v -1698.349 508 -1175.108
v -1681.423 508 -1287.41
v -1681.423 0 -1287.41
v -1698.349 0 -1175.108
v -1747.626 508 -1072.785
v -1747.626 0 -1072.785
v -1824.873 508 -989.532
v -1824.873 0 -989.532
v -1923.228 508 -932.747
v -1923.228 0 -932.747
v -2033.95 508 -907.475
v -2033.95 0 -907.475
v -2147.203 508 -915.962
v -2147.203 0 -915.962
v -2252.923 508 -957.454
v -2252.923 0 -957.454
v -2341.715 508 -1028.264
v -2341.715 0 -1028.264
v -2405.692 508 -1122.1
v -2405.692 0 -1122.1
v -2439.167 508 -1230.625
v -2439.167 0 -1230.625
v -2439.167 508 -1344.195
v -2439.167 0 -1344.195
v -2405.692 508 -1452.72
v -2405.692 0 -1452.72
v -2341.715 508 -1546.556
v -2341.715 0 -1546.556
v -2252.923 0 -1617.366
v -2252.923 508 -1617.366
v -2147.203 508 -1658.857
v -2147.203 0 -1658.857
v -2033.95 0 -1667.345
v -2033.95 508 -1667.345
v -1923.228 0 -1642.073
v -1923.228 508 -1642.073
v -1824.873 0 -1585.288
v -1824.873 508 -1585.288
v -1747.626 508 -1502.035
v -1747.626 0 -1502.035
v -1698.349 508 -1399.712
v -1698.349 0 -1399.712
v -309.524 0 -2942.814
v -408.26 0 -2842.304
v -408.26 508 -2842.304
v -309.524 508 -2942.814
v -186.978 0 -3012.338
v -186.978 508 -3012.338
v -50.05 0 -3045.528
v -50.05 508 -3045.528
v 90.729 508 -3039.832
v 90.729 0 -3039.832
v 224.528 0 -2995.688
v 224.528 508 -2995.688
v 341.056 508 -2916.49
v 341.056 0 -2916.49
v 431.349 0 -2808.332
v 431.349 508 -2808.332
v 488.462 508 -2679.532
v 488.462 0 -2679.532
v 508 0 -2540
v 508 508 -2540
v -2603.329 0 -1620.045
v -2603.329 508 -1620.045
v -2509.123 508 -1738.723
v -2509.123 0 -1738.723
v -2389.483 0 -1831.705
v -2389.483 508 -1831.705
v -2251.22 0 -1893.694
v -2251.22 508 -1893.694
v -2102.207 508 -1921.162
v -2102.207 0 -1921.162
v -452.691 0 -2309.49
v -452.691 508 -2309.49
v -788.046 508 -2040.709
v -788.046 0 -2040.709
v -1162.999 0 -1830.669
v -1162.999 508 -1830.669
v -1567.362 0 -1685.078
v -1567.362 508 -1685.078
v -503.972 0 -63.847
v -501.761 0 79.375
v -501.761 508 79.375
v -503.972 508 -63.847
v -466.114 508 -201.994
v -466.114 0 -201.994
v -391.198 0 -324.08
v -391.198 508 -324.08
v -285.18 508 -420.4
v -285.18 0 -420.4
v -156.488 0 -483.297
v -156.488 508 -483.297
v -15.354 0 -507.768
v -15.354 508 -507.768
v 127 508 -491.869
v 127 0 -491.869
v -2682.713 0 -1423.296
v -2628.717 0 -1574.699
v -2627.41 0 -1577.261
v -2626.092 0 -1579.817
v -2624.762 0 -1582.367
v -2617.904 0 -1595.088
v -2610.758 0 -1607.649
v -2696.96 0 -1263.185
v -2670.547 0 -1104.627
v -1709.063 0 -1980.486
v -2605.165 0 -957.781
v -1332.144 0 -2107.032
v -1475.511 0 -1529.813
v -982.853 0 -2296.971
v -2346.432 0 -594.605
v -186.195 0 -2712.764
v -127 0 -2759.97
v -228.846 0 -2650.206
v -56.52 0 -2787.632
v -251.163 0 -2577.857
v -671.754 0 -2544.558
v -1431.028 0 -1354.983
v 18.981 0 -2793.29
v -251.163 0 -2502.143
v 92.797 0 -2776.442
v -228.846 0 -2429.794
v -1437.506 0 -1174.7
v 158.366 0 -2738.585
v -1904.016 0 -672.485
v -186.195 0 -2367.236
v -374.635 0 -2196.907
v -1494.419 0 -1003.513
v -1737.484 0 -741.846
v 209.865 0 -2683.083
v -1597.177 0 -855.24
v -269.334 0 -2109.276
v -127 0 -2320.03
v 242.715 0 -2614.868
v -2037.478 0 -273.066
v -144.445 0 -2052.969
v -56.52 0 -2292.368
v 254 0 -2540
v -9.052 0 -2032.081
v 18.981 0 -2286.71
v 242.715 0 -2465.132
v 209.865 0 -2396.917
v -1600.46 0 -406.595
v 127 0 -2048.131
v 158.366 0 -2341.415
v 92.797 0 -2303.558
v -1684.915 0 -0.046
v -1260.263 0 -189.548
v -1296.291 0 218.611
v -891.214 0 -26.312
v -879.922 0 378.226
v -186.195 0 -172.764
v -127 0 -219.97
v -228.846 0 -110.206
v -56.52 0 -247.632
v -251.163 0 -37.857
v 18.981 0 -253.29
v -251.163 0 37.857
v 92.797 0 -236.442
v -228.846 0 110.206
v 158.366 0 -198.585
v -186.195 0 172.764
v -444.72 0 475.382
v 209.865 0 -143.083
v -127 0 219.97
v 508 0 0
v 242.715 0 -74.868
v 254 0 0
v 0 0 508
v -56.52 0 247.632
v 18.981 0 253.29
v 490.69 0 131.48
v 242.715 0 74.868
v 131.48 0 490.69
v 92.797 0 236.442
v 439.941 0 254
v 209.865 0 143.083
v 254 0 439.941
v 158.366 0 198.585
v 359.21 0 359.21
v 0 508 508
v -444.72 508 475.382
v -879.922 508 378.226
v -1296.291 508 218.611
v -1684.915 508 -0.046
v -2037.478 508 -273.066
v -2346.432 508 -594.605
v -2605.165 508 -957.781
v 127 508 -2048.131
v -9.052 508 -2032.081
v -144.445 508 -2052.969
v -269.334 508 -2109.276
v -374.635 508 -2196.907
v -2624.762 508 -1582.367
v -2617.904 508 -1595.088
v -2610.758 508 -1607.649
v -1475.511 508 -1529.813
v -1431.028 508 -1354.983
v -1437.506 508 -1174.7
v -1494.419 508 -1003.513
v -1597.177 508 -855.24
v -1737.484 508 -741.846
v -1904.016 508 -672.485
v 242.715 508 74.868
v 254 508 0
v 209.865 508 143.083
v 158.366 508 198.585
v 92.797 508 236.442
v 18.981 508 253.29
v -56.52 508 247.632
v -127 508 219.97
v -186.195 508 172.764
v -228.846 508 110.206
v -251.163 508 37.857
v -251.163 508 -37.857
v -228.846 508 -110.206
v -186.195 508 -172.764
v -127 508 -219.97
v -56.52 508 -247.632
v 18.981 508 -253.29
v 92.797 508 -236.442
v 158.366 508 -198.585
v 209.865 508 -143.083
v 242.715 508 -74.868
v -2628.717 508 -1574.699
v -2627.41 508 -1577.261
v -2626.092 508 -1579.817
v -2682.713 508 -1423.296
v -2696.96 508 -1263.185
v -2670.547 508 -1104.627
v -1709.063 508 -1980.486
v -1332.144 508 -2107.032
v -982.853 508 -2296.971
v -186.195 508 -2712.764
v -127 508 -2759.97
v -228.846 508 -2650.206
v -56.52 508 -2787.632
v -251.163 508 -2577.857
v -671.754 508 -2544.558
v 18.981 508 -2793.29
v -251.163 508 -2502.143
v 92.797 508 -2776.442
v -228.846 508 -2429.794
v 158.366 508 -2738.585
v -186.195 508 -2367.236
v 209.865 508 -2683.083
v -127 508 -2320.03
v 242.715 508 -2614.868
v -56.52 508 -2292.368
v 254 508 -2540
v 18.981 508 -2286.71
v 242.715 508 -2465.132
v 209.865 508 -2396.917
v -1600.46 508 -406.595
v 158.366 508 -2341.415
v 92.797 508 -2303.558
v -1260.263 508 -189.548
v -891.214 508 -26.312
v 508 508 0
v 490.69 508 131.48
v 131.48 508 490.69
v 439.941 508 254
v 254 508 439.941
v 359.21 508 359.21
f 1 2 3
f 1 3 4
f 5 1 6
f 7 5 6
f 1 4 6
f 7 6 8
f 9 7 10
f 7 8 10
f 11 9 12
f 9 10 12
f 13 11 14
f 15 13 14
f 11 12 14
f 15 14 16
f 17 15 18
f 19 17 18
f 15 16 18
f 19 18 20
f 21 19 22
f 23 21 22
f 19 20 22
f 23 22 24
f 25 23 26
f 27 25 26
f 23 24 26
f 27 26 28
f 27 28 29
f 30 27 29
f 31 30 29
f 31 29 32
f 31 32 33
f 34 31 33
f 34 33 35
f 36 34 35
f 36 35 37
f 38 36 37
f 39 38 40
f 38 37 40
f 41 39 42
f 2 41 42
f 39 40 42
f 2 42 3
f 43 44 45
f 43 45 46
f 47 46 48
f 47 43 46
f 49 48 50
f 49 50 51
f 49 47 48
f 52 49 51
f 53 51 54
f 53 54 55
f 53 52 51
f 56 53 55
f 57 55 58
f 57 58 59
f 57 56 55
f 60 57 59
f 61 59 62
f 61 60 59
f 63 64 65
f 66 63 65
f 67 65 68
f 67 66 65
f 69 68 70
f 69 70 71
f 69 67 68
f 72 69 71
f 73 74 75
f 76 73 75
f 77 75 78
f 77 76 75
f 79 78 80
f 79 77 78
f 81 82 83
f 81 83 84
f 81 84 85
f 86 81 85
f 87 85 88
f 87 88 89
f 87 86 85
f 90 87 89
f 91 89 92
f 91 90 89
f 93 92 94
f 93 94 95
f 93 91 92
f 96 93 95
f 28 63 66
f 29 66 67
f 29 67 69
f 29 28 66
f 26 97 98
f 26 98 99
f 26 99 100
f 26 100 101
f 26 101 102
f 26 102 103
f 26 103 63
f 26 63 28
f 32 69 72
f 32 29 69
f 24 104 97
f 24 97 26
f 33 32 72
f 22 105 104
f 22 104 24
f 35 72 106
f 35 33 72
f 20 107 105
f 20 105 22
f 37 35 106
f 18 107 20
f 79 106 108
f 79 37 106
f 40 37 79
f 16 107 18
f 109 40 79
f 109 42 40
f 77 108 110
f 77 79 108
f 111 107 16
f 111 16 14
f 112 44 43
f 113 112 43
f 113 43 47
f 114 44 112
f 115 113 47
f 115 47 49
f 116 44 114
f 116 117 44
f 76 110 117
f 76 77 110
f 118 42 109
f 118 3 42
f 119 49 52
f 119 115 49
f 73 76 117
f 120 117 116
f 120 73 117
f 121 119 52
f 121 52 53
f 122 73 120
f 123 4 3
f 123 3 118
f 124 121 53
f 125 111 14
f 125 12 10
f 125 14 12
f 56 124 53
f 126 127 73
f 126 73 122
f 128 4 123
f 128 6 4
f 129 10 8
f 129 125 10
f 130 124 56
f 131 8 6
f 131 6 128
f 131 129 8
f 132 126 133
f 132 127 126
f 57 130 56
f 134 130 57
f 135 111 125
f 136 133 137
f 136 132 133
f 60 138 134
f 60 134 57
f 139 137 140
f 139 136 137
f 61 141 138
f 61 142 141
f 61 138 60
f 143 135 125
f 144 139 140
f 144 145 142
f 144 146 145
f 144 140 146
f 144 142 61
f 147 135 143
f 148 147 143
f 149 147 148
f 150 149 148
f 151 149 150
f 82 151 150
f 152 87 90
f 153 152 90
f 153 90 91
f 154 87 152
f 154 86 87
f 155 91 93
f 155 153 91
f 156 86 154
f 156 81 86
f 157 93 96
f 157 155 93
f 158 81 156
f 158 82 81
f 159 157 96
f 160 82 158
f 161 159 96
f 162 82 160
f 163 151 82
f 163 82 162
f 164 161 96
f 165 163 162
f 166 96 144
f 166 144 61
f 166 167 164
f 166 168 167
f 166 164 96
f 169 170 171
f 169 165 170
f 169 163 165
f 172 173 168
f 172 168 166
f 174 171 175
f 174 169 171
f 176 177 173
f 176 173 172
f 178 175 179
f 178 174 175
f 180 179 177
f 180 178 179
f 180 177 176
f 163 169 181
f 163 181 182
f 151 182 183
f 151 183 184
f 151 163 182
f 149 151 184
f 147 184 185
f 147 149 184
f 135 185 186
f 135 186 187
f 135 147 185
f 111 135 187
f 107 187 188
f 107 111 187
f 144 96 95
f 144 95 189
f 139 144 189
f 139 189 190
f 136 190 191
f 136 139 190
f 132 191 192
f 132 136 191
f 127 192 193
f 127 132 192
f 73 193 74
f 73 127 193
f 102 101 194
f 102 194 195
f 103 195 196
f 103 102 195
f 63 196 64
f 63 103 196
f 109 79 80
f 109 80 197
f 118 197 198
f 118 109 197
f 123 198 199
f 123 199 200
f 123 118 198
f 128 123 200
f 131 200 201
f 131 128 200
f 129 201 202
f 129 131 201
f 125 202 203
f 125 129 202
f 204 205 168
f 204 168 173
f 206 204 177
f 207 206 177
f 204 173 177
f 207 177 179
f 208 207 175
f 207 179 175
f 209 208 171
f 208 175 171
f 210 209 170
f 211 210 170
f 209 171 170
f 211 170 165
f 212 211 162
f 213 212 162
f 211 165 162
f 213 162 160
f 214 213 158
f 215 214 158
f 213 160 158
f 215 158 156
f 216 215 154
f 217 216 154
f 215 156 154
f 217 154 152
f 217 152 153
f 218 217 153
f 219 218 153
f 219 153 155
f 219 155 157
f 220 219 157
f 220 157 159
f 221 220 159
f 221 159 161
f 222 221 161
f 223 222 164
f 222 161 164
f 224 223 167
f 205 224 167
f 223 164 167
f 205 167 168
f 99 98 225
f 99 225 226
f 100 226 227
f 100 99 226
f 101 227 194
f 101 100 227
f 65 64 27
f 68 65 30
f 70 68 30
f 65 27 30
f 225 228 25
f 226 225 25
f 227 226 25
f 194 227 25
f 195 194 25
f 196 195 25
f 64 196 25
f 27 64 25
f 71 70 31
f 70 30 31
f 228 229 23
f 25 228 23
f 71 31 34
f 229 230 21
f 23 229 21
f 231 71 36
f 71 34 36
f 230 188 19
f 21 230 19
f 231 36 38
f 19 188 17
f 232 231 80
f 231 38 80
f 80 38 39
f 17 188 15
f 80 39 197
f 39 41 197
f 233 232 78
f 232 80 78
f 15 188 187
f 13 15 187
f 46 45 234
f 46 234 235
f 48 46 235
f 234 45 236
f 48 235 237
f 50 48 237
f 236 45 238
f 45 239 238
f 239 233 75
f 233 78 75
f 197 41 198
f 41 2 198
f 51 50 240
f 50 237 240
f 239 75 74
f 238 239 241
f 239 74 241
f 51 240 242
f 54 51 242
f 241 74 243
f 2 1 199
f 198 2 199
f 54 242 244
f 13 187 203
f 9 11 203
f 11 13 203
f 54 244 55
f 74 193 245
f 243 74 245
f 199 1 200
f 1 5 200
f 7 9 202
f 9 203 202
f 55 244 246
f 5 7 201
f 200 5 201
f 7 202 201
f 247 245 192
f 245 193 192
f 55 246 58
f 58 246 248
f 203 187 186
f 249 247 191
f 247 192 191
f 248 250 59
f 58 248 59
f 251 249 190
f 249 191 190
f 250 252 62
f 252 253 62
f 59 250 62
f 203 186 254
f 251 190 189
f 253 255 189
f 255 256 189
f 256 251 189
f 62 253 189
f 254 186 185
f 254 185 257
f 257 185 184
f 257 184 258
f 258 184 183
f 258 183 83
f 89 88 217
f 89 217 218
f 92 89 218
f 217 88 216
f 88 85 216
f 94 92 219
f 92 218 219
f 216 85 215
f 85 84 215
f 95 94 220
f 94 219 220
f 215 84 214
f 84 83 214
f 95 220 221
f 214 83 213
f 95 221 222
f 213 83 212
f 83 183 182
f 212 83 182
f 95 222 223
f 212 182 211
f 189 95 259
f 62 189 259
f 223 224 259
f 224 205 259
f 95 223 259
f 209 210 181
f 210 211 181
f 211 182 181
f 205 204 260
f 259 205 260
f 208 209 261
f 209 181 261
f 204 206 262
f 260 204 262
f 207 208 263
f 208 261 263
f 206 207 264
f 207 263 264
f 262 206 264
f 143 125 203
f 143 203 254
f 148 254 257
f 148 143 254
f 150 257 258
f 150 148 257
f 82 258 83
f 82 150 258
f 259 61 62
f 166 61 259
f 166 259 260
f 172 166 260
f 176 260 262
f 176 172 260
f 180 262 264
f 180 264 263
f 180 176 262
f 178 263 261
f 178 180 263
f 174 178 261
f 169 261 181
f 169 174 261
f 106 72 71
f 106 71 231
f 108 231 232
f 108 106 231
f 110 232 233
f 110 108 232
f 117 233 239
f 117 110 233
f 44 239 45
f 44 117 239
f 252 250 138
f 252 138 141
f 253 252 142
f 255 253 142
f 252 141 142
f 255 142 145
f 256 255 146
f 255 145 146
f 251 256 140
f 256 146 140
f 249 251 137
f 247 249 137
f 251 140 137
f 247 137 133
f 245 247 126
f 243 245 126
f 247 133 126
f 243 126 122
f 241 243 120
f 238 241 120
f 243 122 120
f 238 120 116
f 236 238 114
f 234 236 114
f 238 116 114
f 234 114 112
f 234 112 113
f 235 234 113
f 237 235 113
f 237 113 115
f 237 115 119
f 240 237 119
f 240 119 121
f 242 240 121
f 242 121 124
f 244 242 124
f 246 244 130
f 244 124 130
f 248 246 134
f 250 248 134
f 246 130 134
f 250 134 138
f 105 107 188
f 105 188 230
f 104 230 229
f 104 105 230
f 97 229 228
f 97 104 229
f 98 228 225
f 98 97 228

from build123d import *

# Parameters (mm, degrees)
F0_R     = 381
F0_R_2   = 254
F1_DEPTH = 508


with BuildPart() as f1:
    # F0 (on Front) → F1 (new body)
    with BuildSketch(Plane.XZ):
        with BuildLine():
            Line((508, -2540), (508, 0))
            ThreePointArc((508, 0), (359.210245, 359.210245), (0, 508))
            ThreePointArc((0, 508), (-1494.607046, 116.398648), (-2605.165444, -957.780986))
            ThreePointArc((-2605.165444, -957.780986), (-2696.960404, -1263.185372), (-2628.717375, -1574.699484))
            ThreePointArc((-2628.717375, -1574.699484), (-2626.752641, -1578.539908), (-2624.761863, -1582.366897))
            ThreePointArc((-2624.761863, -1582.366897), (-2614.366803, -1601.388681), (-2603.328551, -1620.04458))
            ThreePointArc((-2603.328551, -1620.04458), (-2389.482729, -1831.704629), (-2102.207052, -1921.162424))
            ThreePointArc((-2102.207052, -1921.162424), (-1153.361276, -2194.393496), (-408.260168, -2842.303879))
            ThreePointArc((-408.260168, -2842.303879), (159.16632, -3022.421064), (508, -2540))
        make_face()
        with Locations((-2062.422644, -1287.409948)):
            Circle(F0_R, mode=Mode.SUBTRACT)
        with Locations((0, -2540)):
            Circle(F0_R_2, mode=Mode.SUBTRACT)
        with BuildLine():
            ThreePointArc((-1904.016184, -672.485242), (-1260.263397, -189.54788), (-501.76051, 79.375))
            ThreePointArc((-501.76051, 79.375), (-341.601016, -375.995673), (127, -491.868885))
            Line((127, -491.868885), (127, -2048.131115))
            ThreePointArc((127, -2048.131115), (-208.796039, -2076.89287), (-452.691028, -2309.490059))
            ThreePointArc((-452.691028, -2309.490059), (-971.187497, -1927.950393), (-1567.362196, -1685.078344))
            ThreePointArc((-1567.362196, -1685.078344), (-1459.85236, -1087.075096), (-1904.016184, -672.485242))
        make_face(mode=Mode.SUBTRACT)
        Circle(F0_R_2, mode=Mode.SUBTRACT)
    extrude(amount=-F1_DEPTH)


solid = f1.part
